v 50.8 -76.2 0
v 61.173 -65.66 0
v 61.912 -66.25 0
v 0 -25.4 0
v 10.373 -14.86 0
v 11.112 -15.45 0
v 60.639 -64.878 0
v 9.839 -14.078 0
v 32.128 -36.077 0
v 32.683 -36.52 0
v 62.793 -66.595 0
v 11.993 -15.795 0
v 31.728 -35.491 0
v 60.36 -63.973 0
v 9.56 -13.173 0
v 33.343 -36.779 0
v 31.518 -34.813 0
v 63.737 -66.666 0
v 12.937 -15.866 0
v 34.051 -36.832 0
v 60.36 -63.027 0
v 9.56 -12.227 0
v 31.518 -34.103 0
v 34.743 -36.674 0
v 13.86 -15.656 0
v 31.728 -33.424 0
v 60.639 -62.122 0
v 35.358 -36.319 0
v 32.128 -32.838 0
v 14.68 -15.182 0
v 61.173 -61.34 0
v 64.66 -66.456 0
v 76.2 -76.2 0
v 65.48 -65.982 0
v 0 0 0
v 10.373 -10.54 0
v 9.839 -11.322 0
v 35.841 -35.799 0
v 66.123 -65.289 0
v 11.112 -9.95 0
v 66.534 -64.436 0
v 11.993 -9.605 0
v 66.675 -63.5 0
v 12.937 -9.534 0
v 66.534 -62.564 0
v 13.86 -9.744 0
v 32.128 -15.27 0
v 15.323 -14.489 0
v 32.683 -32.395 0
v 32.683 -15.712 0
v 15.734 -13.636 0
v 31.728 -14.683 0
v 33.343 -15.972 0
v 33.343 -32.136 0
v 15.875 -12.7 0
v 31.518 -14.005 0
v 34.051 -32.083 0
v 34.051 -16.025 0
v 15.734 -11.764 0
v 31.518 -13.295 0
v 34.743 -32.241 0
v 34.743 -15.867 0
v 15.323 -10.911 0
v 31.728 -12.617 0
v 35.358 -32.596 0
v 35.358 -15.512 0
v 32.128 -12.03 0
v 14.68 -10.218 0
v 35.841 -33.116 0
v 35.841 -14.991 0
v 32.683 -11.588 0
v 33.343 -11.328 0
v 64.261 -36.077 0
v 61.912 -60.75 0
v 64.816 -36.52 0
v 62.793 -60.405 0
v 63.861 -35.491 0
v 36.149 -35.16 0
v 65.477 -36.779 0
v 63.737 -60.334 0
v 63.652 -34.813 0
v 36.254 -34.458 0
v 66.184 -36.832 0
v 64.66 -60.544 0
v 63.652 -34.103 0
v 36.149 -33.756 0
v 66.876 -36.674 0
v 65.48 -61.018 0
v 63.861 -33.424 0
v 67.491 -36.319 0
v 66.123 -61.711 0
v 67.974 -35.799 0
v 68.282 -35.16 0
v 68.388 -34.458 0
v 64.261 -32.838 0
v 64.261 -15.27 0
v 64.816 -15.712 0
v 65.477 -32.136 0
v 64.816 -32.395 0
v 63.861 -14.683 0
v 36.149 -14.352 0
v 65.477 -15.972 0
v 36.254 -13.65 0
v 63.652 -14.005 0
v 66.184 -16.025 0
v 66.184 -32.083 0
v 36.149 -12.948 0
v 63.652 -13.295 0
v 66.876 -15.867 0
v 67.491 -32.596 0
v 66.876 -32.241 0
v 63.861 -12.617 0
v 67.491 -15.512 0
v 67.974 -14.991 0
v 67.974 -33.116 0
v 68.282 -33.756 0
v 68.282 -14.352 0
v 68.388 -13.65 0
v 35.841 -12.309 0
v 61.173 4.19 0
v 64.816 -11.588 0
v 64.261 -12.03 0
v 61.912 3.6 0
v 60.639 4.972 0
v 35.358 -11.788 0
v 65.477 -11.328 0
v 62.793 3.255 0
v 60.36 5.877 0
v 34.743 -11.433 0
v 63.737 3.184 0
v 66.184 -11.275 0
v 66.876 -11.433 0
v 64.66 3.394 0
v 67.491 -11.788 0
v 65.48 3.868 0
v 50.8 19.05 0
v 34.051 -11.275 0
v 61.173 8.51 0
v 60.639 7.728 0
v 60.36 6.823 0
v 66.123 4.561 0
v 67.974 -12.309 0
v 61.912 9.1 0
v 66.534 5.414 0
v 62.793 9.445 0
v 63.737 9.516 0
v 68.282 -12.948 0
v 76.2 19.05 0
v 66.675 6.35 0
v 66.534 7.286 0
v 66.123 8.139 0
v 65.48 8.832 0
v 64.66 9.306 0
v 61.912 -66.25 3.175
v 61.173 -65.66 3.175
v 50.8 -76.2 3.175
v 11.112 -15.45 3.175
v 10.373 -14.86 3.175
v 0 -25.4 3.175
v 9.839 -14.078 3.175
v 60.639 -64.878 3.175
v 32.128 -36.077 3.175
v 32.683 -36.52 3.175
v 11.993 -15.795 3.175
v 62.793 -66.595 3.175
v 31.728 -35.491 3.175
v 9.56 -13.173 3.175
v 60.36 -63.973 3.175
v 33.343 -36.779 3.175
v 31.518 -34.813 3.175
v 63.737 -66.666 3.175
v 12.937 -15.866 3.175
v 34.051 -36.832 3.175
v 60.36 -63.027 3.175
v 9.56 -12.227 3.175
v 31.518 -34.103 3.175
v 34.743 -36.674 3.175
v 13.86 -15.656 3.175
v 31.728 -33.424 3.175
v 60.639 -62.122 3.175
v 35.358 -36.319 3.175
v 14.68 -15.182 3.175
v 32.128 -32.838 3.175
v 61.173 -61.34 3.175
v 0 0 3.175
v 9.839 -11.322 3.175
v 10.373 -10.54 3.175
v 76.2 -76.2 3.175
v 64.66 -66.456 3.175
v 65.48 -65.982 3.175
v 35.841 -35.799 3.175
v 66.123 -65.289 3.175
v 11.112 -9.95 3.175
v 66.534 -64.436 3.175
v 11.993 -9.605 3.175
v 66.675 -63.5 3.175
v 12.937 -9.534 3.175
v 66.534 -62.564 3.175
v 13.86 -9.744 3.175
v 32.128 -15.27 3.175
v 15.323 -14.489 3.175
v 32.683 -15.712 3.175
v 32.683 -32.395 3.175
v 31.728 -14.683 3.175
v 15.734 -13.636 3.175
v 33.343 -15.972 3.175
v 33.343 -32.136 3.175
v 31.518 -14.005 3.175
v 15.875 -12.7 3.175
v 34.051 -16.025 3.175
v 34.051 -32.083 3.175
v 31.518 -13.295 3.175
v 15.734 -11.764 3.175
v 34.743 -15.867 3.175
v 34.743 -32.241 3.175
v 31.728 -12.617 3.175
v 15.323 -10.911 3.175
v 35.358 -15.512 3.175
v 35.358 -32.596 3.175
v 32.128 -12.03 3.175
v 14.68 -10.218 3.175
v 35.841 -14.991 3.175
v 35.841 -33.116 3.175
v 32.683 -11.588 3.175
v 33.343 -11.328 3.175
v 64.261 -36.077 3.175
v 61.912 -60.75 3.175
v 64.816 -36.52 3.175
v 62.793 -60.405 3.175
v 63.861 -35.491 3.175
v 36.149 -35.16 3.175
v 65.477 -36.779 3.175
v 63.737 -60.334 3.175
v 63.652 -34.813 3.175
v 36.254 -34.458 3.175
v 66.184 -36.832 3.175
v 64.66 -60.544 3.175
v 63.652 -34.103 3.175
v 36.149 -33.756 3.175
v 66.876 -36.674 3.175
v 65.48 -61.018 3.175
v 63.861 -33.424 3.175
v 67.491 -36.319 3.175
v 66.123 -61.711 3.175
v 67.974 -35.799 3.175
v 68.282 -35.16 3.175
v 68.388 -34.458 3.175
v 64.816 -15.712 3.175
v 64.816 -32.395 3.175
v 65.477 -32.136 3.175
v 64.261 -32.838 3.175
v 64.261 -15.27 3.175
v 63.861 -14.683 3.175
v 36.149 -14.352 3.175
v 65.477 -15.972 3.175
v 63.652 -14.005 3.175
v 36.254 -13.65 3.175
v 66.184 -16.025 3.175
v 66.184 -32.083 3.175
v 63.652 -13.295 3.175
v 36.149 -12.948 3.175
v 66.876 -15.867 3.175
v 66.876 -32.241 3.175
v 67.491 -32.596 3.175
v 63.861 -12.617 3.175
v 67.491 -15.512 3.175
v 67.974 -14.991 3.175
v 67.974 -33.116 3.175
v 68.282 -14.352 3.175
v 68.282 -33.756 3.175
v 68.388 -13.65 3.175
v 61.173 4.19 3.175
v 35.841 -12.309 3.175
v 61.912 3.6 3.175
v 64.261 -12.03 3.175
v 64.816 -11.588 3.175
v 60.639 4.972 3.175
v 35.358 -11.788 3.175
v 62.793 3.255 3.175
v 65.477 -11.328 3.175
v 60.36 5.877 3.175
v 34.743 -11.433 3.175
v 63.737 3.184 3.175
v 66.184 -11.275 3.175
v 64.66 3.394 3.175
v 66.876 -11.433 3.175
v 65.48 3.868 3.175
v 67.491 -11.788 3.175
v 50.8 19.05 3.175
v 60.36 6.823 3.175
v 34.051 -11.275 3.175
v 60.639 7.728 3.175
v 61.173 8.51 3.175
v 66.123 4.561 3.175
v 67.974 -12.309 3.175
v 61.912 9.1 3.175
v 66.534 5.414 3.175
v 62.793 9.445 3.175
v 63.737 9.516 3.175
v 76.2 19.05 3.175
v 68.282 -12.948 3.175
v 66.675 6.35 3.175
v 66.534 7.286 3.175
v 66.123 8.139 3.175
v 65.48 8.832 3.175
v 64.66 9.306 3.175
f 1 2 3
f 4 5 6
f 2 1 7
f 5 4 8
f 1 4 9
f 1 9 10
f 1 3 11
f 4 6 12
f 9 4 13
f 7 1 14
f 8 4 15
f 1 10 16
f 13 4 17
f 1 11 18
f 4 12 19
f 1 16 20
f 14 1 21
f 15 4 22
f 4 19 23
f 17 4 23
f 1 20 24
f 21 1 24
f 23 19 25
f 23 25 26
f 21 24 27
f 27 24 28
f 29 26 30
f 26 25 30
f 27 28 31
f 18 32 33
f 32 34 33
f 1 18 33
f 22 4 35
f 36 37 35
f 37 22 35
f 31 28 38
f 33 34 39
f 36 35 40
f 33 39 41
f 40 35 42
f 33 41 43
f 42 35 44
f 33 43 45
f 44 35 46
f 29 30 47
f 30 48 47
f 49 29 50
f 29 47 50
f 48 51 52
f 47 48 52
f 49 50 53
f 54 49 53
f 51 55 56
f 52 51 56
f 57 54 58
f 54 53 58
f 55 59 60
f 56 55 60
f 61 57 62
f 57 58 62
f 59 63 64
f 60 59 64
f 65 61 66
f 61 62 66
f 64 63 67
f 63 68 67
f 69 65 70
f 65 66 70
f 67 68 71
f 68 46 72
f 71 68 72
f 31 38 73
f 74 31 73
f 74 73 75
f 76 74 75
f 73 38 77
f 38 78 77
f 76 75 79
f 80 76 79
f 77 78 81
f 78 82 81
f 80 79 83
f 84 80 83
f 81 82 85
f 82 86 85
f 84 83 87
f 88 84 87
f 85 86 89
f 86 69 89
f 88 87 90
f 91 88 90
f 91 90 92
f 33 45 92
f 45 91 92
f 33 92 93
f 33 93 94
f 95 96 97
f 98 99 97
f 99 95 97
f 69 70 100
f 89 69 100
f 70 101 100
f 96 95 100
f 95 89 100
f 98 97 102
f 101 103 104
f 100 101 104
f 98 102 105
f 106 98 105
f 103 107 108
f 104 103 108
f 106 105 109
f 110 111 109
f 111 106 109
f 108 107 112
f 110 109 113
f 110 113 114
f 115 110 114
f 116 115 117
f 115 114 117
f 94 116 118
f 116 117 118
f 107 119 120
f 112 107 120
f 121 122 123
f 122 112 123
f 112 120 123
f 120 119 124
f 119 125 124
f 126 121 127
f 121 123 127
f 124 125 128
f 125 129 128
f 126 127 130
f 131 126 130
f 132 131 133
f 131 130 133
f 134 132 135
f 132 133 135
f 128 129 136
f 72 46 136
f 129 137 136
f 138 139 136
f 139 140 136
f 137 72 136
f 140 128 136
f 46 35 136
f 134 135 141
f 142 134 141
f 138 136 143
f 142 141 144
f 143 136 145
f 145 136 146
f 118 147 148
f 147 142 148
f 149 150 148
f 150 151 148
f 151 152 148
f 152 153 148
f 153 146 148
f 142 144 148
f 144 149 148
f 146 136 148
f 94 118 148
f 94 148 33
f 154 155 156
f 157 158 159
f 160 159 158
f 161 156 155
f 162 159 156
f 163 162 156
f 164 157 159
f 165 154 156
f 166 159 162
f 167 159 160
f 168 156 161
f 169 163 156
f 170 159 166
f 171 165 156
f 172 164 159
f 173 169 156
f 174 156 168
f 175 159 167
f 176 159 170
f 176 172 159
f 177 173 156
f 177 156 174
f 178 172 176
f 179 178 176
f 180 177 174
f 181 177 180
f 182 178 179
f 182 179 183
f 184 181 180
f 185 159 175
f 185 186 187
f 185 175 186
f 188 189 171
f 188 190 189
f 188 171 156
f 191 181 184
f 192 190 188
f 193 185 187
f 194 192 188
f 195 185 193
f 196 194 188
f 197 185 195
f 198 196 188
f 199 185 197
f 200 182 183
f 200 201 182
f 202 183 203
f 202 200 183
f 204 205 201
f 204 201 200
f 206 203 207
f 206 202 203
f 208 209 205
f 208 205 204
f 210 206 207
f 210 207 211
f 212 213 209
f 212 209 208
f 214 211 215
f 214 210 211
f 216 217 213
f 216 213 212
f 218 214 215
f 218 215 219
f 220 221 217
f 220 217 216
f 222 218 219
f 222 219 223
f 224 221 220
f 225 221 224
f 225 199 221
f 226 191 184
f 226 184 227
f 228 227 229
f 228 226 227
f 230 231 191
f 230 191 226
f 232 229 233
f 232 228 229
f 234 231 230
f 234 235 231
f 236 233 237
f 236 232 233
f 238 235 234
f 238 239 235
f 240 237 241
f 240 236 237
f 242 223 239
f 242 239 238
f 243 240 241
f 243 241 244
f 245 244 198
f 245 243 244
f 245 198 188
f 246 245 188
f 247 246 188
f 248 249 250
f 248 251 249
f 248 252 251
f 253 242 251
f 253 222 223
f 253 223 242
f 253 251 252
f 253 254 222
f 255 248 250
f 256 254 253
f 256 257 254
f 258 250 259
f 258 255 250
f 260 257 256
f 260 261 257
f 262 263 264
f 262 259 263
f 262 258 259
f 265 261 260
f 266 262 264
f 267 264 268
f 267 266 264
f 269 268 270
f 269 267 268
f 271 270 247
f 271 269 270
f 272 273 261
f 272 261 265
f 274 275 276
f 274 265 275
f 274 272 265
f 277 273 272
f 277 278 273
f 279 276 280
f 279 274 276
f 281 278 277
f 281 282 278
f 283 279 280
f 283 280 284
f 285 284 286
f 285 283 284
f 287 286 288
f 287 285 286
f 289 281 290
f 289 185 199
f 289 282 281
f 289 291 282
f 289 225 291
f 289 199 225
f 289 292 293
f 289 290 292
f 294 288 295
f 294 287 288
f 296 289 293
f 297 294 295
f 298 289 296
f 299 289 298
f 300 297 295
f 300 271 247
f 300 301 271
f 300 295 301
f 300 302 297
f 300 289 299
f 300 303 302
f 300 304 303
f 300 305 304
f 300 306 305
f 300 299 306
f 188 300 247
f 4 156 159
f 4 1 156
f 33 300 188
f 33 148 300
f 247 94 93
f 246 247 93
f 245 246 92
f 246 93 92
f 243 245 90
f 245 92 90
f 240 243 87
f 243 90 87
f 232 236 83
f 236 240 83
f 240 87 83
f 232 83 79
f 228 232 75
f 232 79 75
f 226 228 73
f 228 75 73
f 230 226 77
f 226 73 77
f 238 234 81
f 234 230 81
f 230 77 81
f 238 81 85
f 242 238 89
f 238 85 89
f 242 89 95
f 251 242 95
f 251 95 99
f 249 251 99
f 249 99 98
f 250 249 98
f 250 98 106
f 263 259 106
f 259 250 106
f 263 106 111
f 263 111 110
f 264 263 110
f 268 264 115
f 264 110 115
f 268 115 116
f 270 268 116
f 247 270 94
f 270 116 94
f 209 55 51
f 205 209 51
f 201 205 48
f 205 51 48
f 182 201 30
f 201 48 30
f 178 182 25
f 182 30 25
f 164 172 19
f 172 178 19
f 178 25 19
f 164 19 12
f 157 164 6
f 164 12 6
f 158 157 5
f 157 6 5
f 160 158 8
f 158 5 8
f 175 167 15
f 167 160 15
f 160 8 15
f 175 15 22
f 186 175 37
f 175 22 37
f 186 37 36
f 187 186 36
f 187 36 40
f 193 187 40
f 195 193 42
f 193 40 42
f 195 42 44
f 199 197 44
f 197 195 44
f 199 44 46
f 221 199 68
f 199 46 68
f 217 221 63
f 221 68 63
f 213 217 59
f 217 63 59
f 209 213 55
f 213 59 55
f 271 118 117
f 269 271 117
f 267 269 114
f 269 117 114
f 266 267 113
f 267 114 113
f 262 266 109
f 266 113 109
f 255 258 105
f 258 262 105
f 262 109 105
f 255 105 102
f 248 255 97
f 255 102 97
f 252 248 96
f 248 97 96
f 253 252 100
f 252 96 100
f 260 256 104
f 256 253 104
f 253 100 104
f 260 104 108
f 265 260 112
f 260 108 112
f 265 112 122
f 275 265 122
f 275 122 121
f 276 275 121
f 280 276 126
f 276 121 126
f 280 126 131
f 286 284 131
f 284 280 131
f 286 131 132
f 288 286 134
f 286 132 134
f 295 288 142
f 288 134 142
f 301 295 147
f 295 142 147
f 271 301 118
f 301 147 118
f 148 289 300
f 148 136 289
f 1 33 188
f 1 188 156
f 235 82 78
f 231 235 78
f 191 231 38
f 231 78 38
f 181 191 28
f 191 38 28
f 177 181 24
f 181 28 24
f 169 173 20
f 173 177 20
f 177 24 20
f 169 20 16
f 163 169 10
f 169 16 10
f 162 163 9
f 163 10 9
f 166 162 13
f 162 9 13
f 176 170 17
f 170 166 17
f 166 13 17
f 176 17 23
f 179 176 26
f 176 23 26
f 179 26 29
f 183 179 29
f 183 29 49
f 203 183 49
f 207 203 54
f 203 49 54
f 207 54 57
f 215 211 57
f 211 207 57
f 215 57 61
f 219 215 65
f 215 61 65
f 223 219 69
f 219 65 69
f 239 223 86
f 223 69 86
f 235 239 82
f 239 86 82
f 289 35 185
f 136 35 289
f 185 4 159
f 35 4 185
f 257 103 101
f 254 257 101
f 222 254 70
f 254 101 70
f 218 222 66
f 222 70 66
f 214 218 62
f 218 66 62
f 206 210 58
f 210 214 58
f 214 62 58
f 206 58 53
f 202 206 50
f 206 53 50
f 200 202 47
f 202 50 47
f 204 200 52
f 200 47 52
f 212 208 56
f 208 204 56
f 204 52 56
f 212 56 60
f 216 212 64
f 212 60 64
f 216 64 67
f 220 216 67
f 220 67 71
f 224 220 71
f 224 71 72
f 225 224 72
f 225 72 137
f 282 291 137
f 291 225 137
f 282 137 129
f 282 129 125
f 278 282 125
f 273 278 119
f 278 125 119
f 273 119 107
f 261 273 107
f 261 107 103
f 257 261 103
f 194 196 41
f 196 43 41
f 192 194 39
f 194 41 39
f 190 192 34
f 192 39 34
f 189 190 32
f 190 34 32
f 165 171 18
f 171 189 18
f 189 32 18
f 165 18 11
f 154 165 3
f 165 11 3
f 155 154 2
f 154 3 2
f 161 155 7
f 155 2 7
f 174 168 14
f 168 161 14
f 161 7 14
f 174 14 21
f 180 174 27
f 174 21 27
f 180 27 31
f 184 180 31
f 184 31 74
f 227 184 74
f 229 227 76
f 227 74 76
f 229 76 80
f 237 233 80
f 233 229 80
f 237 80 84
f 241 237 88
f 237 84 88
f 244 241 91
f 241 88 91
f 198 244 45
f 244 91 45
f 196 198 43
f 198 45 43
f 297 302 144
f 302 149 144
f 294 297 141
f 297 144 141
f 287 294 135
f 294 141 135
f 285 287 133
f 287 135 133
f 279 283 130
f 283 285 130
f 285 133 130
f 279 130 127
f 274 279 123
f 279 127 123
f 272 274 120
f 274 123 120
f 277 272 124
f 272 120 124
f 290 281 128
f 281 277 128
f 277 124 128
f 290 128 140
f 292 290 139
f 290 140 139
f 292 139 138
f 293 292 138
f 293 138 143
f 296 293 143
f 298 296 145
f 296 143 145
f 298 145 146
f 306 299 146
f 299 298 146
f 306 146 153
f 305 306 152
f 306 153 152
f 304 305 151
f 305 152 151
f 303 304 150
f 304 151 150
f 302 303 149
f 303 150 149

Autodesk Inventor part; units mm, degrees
ref_plane "YZ Plane" through (0, 0, 0) normal (1, 0, 0) x (0, 1, 0)
ref_plane "XZ Plane" through (0, 0, 0) normal (0, 1, 0) x (-1, 0, 0)
ref_plane "XY Plane" through (0, 0, 0) normal (0, 0, 1) x (1, 0, 0)
sketch "Sketch1" plane through (0, 0, 0) normal (0, 0, 1) x (1, 0, 0)
  line L0 (0, 0) -> (50.8, 19.05)
  line L1 (50.8, 19.05) -> (76.2, 19.05)
  line L2 (76.2, 19.05) -> (76.2, -76.2)
  line L3 (76.2, -76.2) -> (50.8, -76.2)
  line L4 (50.8, -76.2) -> (0, -25.4)
  line L5 (0, -25.4) -> (0, 0)
  line L6 (76.2, -6.35) -> (26.8732, -6.35) construction
  line L7 (26.8732, -6.35) -> (26.8732, -41.7576) construction
  line L8 (26.8732, -41.7576) -> (76.2, -41.7576) construction
  line L9 (76.2, -41.7576) -> (76.2, -6.35) construction
  circle A0 centre (33.8732, -13.65) radius 2.3813
  circle A1 centre (66.0064, -13.65) radius 2.3813
  circle A2 centre (33.8732, -34.4576) radius 2.3813
  circle A3 centre (66.0064, -34.4576) radius 2.3813
  line L10 (0, 0) -> (76.2, 0) construction
  circle A4 centre (12.7, -12.7) radius 3.175
  circle A5 centre (63.5, -63.5) radius 3.175
  circle A6 centre (63.5, 6.35) radius 3.175
  dimension "d0" = 25.4
  dimension "d1" = 95.25
  dimension "d2" = 19.05
  dimension "d3" = 76.2
  dimension "d4" = 25.4
  dimension "d5" = 25.4
  dimension "d6" = 49.3268
  dimension "d7" = 35.4076
  dimension "d8" = 25.4
  dimension "d9" = 4.7625
  dimension "d10" = 7.3
  dimension "d11" = 7.3
  dimension "d12" = 7.3
  dimension "d13" = 7.3
  dimension "d14" = 10.1936
  dimension "d15" = 10.1936
  dimension "d16" = 7
  dimension "d17" = 7
  dimension "d18" = 6.35
  dimension "d19" = 12.7
  dimension "d20" = 12.7
  dimension "d21" = 6.35
  dimension "d22" = 6.35
  dimension "d23" = 12.7
  dimension "d24" = 12.7
  dimension "d25" = 12.7
  dimension "d26" = 12.7
extrude "Extrusion1" add sketch "Sketch1" along normal blind 3.175
properties part number "15102898-16-P-0309" material "Aluminum 6061"
